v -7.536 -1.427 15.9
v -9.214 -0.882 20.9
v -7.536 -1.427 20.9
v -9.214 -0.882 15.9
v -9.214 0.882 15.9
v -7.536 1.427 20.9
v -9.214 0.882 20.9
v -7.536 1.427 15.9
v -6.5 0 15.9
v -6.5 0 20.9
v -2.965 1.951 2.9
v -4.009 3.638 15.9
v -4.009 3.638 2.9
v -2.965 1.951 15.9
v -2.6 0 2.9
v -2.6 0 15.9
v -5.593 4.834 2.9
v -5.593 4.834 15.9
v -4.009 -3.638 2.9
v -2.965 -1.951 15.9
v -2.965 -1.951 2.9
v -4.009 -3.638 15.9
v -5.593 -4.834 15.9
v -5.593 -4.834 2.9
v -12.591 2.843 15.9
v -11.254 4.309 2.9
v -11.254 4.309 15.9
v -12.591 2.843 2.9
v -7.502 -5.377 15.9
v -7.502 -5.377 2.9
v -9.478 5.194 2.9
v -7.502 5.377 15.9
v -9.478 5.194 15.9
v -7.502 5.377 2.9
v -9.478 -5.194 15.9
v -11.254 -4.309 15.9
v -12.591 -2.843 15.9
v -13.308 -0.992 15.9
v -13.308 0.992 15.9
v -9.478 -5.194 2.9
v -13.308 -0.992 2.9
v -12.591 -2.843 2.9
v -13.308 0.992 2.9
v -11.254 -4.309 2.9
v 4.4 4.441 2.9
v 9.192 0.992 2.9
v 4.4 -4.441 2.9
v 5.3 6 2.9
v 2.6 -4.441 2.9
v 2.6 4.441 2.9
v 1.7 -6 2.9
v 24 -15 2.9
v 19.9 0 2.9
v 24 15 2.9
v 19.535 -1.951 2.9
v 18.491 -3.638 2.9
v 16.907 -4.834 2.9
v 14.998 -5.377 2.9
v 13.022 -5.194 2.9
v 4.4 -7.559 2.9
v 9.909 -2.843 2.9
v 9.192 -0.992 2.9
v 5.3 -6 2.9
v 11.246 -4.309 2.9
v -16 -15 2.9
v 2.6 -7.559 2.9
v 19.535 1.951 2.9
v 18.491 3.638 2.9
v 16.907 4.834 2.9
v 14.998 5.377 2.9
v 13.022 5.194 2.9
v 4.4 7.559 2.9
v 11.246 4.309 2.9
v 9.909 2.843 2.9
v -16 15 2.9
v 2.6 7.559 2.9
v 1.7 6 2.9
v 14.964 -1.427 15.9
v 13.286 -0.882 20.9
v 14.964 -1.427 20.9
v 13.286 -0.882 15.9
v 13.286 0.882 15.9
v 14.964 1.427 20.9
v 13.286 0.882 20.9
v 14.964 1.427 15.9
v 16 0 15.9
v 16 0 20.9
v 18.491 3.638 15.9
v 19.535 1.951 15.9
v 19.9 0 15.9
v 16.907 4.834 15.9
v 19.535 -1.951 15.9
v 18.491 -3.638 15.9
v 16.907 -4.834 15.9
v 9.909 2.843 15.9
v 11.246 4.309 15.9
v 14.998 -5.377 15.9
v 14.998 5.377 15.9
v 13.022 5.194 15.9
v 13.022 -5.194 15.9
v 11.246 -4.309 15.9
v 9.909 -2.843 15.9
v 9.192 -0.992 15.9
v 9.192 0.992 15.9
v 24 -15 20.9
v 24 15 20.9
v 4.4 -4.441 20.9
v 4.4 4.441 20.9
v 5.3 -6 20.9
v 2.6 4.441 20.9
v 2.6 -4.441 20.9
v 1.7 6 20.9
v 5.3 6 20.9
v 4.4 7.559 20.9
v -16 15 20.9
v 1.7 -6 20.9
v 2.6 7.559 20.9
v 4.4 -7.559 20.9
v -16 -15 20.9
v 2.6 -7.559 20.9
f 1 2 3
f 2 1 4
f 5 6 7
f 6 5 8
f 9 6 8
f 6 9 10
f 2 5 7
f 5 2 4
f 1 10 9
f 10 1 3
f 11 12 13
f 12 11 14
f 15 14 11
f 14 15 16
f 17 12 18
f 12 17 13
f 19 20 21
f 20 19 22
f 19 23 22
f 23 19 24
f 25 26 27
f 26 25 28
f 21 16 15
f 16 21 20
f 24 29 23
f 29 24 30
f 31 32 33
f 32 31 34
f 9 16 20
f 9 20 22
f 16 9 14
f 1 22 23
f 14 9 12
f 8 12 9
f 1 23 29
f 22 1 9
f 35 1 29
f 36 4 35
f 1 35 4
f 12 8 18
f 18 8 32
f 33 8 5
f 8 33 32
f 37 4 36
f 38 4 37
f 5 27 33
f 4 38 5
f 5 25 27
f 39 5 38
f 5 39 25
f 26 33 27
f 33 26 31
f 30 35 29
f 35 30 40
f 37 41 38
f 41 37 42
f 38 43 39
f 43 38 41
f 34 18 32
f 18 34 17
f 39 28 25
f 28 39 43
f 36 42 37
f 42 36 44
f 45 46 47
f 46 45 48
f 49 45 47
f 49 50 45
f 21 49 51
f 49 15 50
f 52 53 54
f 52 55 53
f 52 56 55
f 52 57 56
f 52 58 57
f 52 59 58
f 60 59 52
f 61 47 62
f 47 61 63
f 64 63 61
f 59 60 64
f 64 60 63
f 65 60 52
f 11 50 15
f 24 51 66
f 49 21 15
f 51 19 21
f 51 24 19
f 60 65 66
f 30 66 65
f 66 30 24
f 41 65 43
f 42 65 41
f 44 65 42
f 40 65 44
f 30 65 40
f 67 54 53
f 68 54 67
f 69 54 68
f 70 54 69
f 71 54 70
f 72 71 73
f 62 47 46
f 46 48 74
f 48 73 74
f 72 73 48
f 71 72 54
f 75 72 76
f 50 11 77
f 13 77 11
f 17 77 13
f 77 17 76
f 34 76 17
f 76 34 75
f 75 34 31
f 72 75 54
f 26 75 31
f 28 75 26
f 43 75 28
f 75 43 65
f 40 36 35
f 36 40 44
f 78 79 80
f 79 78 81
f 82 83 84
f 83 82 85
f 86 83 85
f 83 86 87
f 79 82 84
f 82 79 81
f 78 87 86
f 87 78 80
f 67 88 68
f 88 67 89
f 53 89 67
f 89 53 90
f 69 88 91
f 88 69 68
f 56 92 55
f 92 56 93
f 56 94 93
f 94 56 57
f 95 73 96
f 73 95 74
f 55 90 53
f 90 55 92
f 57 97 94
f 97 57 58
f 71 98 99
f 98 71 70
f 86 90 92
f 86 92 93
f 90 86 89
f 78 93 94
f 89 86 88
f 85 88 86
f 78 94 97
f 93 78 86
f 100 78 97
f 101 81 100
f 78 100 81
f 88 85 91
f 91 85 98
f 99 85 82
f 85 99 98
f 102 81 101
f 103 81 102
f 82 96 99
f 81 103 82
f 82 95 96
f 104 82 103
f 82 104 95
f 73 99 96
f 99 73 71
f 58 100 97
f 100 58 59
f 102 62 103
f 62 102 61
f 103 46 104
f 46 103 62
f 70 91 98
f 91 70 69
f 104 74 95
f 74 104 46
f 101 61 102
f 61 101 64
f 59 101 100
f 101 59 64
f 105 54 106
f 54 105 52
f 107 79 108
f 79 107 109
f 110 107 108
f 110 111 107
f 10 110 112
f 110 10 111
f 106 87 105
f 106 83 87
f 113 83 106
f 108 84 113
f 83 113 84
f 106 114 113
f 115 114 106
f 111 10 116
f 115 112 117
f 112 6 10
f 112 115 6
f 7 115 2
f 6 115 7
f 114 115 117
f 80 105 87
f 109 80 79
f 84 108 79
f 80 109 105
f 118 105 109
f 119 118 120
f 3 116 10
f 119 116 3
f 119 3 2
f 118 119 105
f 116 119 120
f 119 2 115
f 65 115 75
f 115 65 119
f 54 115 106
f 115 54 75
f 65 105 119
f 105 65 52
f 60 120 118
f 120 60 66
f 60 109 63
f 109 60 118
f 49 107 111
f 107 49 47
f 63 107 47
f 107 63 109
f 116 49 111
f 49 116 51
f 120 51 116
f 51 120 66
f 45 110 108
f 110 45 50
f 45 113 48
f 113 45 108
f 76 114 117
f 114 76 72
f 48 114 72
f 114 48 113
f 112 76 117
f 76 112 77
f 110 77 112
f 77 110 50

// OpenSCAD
xCarHoleX=26.75;
xCarHoleY=33.20;
xCarHoleZ=2.9;



hotendRadius=8.3;
hotendHeight=17;

tubeEndHeight=13;
tubeEndRadius=5.4;
tubeRadius=2.9;

topX=40;
topY=30;
topZ=tubeEndHeight+5;

filamentRadius=3/2;

no_of_nuts = 2;		// number of captive nuts required, standard = 1
nut_angle = 180;		// angle between nuts, standard = 90
nut_shaft_distance = 2.5;

nut_elevation=10;
m3_dia = 3.2;		// 3mm hole diameter
m3_nut_hex = 1;		// 1 for hex, 0 for square nut
m3_nut_flats = 5.9;	// normal M3 hex nut exact width = 5.5
m3_nut_depth = 2.9;	// normal M3 hex nut exact depth = 2.4, nyloc = 4	
m3_nut_points = 2*((m3_nut_flats/2)/cos(30));

motor_shaft=15;
pulley_b_ht = 15;		// pulley base height, standard = 8. Set to same as idler_ht if you want an idler but no pulley.
pulley_b_dia=40;

difference(){
	union(){
		translate([0,0,xCarHoleZ])top();
//		bottom();
	}
	translate([3.5,-6,-17])m3Screw(40);
	translate([3.5,6,-17])m3Screw(40);
	
}

module top(){
	difference(){
		translate([-topX/2+4,-topY/2,0])cube([topX,topY,topZ]);
		translate([-8,0,-hotendHeight-2])twHotend();
	}
}

module bottom(){
	difference(){
		union(){
			xCarHole();
			translate([-8,0,-hotendHeight])twoHotendHolder();
		}
		translate([-8,0,-hotendHeight-2])twHotend();
	}
}

module xCarHole(){
	hull(){
		cylinder(h=xCarHoleZ, r=xCarHoleX/2);
		translate([xCarHoleY-xCarHoleX,0,0])cylinder(h=xCarHoleZ, r=xCarHoleX/2);
	}
}

module twHotend(){
	hotend();
	translate([22.5,0,0])hotend();
}

module hotend(){
	union(){
		cylinder(h=hotendHeight, r=hotendRadius);
		translate([0,0,-100])cylinder(h=200, r=filamentRadius);
		//tubeend
		translate([0,0,19])cylinder(h=tubeEndHeight,r=tubeEndRadius);
//		#translate([0,0,30])cylinder(h=tubeEndHeight,r=tubeRadius);
	}
	
}
module hotendHolder(){
	difference(){
		cylinder(h=hotendHeight, r=hotendRadius+7);
		translate([0,0,-5])rotate([0,0,0])nuts();		
	}
//	translate([23,0,0])cylinder(h=hotendHeight, r=hotendRadius+10);
	
}
module twoHotendHolder(){
	hotendHolder();
	translate([22.5,0,0])mirror([1,0,0])hotendHolder();
	
}

module nuts(){
	for(j=[1:no_of_nuts]) rotate([0,0,j*nut_angle])
	translate([0,0,nut_elevation])rotate([90,0,0])
	
	union()
	{
		//entrance
		#translate([0,m3_nut_depth/2,motor_shaft/2+m3_nut_depth/2+nut_shaft_distance]) cube([m3_nut_flats,pulley_b_ht,m3_nut_depth],center=true);
		//nut
		if ( m3_nut_hex > 0 )
		{
			// hex nut
			#translate([0,0.25,motor_shaft/2+m3_nut_depth/2+nut_shaft_distance]) rotate([0,0,30]) cylinder(r=m3_nut_points/2,h=m3_nut_depth,center=true,$fn=6);
		} else {
			// square nut
			translate([0,0.25,motor_shaft/2+m3_nut_depth/2+nut_shaft_distance]) cube([m3_nut_flats,m3_nut_flats,m3_nut_depth],center=true);
		}
		
		//grub screw hole
		#rotate([0,0,22.5])cylinder(r=m3_dia/2,h=pulley_b_dia/2+1,$fn=8);
		rotate([0,0,22.5])#translate([0,0,15])cylinder(r=3,h=3,$fn=12);
	}	
}

module m3Screw(h=15) {
	union() {
		translate([0,0,5])cylinder(h=h+5,r=3.6/2);
//		cylinder(h=5,r=3.6/2);
		#translate([0,0,h-0.4])cylinder(h=5.5,r=6.3/2);
		translate([0,0,-0.1])cylinder(h=5.5,r=6.9/2,$fn=6);
	}
}
